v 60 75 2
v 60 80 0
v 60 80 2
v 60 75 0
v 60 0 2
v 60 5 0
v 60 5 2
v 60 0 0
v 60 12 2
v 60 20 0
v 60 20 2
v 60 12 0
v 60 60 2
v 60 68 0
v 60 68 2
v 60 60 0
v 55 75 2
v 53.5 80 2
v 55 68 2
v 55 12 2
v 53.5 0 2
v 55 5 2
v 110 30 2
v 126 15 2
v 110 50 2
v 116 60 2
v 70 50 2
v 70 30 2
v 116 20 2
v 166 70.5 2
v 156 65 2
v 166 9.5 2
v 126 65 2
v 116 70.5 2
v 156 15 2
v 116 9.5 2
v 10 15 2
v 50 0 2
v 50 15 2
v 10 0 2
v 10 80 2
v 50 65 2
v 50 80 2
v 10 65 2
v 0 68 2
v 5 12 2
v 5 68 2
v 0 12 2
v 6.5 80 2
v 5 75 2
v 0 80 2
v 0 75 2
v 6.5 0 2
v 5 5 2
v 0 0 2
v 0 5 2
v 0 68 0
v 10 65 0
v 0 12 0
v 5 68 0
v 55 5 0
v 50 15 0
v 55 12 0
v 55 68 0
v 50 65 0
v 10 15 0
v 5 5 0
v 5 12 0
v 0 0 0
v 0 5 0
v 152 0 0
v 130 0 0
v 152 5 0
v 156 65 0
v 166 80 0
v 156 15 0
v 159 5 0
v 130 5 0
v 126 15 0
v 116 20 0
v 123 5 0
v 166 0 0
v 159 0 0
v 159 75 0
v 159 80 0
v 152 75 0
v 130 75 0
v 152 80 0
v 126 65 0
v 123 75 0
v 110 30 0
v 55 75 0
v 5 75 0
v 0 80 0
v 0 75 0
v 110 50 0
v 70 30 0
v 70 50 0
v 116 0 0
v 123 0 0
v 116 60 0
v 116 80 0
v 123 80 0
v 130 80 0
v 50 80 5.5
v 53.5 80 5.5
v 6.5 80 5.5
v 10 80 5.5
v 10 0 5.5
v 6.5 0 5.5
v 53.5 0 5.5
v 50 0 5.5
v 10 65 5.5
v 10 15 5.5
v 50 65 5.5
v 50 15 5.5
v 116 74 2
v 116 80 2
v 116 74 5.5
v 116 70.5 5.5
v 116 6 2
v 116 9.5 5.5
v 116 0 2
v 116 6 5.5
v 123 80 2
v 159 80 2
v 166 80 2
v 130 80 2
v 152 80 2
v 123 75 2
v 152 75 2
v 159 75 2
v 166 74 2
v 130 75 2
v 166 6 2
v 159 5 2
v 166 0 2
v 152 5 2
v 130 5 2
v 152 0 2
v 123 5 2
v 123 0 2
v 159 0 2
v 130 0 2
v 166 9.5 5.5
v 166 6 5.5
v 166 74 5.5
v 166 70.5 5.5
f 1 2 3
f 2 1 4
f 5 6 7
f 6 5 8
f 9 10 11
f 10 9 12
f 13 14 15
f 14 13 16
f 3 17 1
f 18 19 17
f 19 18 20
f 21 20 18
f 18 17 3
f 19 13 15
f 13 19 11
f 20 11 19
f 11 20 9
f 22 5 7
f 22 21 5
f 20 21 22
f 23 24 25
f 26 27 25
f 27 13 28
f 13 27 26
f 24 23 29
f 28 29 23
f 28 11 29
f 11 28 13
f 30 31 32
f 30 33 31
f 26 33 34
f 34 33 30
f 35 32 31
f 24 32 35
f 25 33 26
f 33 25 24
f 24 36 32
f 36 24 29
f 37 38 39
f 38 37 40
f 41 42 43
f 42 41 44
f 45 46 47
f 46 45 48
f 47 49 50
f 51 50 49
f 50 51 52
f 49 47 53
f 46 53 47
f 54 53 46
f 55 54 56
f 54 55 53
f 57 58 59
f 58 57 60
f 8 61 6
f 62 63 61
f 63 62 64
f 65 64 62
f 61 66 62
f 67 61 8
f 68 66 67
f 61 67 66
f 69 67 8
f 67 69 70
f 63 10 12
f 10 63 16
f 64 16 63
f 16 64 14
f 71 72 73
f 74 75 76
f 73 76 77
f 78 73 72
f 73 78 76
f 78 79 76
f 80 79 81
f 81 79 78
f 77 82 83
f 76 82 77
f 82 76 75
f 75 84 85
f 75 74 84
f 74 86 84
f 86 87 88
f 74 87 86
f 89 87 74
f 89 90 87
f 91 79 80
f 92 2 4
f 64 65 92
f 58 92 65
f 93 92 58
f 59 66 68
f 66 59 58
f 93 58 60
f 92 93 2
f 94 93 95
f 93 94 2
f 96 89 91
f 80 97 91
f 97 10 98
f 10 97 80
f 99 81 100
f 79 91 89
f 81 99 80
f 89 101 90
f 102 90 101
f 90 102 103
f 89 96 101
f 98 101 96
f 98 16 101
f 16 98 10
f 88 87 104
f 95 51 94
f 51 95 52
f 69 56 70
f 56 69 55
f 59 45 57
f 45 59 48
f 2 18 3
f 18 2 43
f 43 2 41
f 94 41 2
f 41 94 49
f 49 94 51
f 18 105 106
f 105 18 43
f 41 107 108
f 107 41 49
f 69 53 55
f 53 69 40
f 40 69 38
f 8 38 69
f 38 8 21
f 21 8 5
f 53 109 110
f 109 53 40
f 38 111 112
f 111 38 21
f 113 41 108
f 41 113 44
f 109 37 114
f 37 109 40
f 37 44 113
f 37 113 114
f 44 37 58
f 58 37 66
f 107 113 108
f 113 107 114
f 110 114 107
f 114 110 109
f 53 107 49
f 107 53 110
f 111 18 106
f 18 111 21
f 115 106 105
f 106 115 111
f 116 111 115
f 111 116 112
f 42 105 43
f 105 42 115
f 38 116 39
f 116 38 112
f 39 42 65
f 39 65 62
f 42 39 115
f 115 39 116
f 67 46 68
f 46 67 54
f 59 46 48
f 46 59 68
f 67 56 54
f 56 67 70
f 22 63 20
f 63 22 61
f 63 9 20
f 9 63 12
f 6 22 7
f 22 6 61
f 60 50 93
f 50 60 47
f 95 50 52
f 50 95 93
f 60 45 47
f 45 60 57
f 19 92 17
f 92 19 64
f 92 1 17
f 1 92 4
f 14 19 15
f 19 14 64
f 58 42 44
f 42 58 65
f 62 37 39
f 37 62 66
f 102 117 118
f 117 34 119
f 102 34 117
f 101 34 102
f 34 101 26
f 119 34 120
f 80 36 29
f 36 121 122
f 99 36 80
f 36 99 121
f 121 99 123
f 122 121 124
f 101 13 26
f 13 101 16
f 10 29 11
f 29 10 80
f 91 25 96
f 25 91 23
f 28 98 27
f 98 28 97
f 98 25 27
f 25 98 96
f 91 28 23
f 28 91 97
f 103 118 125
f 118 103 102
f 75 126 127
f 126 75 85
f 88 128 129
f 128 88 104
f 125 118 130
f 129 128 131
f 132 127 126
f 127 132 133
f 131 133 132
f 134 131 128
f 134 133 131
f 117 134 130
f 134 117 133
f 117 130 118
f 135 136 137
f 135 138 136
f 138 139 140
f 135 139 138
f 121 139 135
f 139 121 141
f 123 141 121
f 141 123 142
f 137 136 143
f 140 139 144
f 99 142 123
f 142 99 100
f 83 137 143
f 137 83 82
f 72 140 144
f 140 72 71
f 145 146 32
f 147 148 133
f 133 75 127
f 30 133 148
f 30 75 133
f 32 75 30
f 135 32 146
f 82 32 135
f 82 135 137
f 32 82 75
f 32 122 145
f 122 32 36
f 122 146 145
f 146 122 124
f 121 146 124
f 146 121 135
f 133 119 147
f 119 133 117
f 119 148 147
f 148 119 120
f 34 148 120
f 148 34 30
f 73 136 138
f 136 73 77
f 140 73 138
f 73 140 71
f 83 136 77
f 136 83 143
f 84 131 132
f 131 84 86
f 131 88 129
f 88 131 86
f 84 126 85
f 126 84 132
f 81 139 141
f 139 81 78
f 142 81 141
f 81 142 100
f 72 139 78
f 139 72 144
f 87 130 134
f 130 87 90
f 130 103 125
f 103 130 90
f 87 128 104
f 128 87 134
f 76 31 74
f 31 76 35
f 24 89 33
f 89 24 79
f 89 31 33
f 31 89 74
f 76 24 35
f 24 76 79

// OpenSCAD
module guidePanel(size, itemWidth, rail) {
    width = size[0];
    depth = size[1];
    height = size[2];

    padding = (width-itemWidth)/2;
    railSize = [rail, depth, rail];
    itemEdges = [padding, padding+itemWidth];

    union() {
        cube(size);
        translate([itemEdges[0]-rail, 0, height]) cube(railSize);
        translate([itemEdges[1]     , 0, height]) cube(railSize);
    }
}

module withCutouts(width, depthOffsets, size) {
    module cutoutPair(y) {
        translate([0,             y, 0]) cube(size);
        translate([width-size[0], y, 0]) cube(size);
    }

    difference() {
        children();
        for (y = depthOffsets) cutoutPair(y);
    }
}

module piPanel() {
    width = 60;
    depth = 80;
    height = 2;

    panelSize = [width, depth, height];

    cutoutSize = [5, 7, height];
    cutoutOffsets = [5, depth-7-5];

    itemWidth = 40;
    rail = 3.5;

    difference() {
        withCutouts(width=width, size=cutoutSize, depthOffsets=cutoutOffsets) {
            guidePanel(size=panelSize, itemWidth=itemWidth, rail=rail);
        }
        translate([10, 15, 0]) cube([40, 50, height+rail]);
    }
}

module connector() {
    width = 56;
    depth = 40;
    height = 2;

    boltSize = [40, 20, height];

    difference() {
        cube([width, depth, height]);
        translate([10, (depth-boltSize[1])/2, 0]) cube(boltSize);
    }
}

module claspPanel() {
    width = 80;
    depth = 50;
    height = 2;

    panelSize = [width, depth, height];

    cutoutSize = [5, 7, height];
    cutoutOffsets = [7, 36];

    itemWidth = 61;
    rail = 3.5;

    difference() {
        translate([depth, 0, 0]) {
            rotate(90) {
                withCutouts(width=width, size=cutoutSize, depthOffsets=cutoutOffsets) {
                    guidePanel(size=panelSize, itemWidth=itemWidth, rail=rail);
                }
            }
        }
        translate([width-70, 15, 0]) cube([30, 50, height+rail]);
    }
}

module clip() {
    union() {
        piPanel();
        translate([60, 0, 0]) {
            translate([0, 20, 0]) connector();
            translate([56, 0, 0]) claspPanel();
        }
    }
}

clip();
